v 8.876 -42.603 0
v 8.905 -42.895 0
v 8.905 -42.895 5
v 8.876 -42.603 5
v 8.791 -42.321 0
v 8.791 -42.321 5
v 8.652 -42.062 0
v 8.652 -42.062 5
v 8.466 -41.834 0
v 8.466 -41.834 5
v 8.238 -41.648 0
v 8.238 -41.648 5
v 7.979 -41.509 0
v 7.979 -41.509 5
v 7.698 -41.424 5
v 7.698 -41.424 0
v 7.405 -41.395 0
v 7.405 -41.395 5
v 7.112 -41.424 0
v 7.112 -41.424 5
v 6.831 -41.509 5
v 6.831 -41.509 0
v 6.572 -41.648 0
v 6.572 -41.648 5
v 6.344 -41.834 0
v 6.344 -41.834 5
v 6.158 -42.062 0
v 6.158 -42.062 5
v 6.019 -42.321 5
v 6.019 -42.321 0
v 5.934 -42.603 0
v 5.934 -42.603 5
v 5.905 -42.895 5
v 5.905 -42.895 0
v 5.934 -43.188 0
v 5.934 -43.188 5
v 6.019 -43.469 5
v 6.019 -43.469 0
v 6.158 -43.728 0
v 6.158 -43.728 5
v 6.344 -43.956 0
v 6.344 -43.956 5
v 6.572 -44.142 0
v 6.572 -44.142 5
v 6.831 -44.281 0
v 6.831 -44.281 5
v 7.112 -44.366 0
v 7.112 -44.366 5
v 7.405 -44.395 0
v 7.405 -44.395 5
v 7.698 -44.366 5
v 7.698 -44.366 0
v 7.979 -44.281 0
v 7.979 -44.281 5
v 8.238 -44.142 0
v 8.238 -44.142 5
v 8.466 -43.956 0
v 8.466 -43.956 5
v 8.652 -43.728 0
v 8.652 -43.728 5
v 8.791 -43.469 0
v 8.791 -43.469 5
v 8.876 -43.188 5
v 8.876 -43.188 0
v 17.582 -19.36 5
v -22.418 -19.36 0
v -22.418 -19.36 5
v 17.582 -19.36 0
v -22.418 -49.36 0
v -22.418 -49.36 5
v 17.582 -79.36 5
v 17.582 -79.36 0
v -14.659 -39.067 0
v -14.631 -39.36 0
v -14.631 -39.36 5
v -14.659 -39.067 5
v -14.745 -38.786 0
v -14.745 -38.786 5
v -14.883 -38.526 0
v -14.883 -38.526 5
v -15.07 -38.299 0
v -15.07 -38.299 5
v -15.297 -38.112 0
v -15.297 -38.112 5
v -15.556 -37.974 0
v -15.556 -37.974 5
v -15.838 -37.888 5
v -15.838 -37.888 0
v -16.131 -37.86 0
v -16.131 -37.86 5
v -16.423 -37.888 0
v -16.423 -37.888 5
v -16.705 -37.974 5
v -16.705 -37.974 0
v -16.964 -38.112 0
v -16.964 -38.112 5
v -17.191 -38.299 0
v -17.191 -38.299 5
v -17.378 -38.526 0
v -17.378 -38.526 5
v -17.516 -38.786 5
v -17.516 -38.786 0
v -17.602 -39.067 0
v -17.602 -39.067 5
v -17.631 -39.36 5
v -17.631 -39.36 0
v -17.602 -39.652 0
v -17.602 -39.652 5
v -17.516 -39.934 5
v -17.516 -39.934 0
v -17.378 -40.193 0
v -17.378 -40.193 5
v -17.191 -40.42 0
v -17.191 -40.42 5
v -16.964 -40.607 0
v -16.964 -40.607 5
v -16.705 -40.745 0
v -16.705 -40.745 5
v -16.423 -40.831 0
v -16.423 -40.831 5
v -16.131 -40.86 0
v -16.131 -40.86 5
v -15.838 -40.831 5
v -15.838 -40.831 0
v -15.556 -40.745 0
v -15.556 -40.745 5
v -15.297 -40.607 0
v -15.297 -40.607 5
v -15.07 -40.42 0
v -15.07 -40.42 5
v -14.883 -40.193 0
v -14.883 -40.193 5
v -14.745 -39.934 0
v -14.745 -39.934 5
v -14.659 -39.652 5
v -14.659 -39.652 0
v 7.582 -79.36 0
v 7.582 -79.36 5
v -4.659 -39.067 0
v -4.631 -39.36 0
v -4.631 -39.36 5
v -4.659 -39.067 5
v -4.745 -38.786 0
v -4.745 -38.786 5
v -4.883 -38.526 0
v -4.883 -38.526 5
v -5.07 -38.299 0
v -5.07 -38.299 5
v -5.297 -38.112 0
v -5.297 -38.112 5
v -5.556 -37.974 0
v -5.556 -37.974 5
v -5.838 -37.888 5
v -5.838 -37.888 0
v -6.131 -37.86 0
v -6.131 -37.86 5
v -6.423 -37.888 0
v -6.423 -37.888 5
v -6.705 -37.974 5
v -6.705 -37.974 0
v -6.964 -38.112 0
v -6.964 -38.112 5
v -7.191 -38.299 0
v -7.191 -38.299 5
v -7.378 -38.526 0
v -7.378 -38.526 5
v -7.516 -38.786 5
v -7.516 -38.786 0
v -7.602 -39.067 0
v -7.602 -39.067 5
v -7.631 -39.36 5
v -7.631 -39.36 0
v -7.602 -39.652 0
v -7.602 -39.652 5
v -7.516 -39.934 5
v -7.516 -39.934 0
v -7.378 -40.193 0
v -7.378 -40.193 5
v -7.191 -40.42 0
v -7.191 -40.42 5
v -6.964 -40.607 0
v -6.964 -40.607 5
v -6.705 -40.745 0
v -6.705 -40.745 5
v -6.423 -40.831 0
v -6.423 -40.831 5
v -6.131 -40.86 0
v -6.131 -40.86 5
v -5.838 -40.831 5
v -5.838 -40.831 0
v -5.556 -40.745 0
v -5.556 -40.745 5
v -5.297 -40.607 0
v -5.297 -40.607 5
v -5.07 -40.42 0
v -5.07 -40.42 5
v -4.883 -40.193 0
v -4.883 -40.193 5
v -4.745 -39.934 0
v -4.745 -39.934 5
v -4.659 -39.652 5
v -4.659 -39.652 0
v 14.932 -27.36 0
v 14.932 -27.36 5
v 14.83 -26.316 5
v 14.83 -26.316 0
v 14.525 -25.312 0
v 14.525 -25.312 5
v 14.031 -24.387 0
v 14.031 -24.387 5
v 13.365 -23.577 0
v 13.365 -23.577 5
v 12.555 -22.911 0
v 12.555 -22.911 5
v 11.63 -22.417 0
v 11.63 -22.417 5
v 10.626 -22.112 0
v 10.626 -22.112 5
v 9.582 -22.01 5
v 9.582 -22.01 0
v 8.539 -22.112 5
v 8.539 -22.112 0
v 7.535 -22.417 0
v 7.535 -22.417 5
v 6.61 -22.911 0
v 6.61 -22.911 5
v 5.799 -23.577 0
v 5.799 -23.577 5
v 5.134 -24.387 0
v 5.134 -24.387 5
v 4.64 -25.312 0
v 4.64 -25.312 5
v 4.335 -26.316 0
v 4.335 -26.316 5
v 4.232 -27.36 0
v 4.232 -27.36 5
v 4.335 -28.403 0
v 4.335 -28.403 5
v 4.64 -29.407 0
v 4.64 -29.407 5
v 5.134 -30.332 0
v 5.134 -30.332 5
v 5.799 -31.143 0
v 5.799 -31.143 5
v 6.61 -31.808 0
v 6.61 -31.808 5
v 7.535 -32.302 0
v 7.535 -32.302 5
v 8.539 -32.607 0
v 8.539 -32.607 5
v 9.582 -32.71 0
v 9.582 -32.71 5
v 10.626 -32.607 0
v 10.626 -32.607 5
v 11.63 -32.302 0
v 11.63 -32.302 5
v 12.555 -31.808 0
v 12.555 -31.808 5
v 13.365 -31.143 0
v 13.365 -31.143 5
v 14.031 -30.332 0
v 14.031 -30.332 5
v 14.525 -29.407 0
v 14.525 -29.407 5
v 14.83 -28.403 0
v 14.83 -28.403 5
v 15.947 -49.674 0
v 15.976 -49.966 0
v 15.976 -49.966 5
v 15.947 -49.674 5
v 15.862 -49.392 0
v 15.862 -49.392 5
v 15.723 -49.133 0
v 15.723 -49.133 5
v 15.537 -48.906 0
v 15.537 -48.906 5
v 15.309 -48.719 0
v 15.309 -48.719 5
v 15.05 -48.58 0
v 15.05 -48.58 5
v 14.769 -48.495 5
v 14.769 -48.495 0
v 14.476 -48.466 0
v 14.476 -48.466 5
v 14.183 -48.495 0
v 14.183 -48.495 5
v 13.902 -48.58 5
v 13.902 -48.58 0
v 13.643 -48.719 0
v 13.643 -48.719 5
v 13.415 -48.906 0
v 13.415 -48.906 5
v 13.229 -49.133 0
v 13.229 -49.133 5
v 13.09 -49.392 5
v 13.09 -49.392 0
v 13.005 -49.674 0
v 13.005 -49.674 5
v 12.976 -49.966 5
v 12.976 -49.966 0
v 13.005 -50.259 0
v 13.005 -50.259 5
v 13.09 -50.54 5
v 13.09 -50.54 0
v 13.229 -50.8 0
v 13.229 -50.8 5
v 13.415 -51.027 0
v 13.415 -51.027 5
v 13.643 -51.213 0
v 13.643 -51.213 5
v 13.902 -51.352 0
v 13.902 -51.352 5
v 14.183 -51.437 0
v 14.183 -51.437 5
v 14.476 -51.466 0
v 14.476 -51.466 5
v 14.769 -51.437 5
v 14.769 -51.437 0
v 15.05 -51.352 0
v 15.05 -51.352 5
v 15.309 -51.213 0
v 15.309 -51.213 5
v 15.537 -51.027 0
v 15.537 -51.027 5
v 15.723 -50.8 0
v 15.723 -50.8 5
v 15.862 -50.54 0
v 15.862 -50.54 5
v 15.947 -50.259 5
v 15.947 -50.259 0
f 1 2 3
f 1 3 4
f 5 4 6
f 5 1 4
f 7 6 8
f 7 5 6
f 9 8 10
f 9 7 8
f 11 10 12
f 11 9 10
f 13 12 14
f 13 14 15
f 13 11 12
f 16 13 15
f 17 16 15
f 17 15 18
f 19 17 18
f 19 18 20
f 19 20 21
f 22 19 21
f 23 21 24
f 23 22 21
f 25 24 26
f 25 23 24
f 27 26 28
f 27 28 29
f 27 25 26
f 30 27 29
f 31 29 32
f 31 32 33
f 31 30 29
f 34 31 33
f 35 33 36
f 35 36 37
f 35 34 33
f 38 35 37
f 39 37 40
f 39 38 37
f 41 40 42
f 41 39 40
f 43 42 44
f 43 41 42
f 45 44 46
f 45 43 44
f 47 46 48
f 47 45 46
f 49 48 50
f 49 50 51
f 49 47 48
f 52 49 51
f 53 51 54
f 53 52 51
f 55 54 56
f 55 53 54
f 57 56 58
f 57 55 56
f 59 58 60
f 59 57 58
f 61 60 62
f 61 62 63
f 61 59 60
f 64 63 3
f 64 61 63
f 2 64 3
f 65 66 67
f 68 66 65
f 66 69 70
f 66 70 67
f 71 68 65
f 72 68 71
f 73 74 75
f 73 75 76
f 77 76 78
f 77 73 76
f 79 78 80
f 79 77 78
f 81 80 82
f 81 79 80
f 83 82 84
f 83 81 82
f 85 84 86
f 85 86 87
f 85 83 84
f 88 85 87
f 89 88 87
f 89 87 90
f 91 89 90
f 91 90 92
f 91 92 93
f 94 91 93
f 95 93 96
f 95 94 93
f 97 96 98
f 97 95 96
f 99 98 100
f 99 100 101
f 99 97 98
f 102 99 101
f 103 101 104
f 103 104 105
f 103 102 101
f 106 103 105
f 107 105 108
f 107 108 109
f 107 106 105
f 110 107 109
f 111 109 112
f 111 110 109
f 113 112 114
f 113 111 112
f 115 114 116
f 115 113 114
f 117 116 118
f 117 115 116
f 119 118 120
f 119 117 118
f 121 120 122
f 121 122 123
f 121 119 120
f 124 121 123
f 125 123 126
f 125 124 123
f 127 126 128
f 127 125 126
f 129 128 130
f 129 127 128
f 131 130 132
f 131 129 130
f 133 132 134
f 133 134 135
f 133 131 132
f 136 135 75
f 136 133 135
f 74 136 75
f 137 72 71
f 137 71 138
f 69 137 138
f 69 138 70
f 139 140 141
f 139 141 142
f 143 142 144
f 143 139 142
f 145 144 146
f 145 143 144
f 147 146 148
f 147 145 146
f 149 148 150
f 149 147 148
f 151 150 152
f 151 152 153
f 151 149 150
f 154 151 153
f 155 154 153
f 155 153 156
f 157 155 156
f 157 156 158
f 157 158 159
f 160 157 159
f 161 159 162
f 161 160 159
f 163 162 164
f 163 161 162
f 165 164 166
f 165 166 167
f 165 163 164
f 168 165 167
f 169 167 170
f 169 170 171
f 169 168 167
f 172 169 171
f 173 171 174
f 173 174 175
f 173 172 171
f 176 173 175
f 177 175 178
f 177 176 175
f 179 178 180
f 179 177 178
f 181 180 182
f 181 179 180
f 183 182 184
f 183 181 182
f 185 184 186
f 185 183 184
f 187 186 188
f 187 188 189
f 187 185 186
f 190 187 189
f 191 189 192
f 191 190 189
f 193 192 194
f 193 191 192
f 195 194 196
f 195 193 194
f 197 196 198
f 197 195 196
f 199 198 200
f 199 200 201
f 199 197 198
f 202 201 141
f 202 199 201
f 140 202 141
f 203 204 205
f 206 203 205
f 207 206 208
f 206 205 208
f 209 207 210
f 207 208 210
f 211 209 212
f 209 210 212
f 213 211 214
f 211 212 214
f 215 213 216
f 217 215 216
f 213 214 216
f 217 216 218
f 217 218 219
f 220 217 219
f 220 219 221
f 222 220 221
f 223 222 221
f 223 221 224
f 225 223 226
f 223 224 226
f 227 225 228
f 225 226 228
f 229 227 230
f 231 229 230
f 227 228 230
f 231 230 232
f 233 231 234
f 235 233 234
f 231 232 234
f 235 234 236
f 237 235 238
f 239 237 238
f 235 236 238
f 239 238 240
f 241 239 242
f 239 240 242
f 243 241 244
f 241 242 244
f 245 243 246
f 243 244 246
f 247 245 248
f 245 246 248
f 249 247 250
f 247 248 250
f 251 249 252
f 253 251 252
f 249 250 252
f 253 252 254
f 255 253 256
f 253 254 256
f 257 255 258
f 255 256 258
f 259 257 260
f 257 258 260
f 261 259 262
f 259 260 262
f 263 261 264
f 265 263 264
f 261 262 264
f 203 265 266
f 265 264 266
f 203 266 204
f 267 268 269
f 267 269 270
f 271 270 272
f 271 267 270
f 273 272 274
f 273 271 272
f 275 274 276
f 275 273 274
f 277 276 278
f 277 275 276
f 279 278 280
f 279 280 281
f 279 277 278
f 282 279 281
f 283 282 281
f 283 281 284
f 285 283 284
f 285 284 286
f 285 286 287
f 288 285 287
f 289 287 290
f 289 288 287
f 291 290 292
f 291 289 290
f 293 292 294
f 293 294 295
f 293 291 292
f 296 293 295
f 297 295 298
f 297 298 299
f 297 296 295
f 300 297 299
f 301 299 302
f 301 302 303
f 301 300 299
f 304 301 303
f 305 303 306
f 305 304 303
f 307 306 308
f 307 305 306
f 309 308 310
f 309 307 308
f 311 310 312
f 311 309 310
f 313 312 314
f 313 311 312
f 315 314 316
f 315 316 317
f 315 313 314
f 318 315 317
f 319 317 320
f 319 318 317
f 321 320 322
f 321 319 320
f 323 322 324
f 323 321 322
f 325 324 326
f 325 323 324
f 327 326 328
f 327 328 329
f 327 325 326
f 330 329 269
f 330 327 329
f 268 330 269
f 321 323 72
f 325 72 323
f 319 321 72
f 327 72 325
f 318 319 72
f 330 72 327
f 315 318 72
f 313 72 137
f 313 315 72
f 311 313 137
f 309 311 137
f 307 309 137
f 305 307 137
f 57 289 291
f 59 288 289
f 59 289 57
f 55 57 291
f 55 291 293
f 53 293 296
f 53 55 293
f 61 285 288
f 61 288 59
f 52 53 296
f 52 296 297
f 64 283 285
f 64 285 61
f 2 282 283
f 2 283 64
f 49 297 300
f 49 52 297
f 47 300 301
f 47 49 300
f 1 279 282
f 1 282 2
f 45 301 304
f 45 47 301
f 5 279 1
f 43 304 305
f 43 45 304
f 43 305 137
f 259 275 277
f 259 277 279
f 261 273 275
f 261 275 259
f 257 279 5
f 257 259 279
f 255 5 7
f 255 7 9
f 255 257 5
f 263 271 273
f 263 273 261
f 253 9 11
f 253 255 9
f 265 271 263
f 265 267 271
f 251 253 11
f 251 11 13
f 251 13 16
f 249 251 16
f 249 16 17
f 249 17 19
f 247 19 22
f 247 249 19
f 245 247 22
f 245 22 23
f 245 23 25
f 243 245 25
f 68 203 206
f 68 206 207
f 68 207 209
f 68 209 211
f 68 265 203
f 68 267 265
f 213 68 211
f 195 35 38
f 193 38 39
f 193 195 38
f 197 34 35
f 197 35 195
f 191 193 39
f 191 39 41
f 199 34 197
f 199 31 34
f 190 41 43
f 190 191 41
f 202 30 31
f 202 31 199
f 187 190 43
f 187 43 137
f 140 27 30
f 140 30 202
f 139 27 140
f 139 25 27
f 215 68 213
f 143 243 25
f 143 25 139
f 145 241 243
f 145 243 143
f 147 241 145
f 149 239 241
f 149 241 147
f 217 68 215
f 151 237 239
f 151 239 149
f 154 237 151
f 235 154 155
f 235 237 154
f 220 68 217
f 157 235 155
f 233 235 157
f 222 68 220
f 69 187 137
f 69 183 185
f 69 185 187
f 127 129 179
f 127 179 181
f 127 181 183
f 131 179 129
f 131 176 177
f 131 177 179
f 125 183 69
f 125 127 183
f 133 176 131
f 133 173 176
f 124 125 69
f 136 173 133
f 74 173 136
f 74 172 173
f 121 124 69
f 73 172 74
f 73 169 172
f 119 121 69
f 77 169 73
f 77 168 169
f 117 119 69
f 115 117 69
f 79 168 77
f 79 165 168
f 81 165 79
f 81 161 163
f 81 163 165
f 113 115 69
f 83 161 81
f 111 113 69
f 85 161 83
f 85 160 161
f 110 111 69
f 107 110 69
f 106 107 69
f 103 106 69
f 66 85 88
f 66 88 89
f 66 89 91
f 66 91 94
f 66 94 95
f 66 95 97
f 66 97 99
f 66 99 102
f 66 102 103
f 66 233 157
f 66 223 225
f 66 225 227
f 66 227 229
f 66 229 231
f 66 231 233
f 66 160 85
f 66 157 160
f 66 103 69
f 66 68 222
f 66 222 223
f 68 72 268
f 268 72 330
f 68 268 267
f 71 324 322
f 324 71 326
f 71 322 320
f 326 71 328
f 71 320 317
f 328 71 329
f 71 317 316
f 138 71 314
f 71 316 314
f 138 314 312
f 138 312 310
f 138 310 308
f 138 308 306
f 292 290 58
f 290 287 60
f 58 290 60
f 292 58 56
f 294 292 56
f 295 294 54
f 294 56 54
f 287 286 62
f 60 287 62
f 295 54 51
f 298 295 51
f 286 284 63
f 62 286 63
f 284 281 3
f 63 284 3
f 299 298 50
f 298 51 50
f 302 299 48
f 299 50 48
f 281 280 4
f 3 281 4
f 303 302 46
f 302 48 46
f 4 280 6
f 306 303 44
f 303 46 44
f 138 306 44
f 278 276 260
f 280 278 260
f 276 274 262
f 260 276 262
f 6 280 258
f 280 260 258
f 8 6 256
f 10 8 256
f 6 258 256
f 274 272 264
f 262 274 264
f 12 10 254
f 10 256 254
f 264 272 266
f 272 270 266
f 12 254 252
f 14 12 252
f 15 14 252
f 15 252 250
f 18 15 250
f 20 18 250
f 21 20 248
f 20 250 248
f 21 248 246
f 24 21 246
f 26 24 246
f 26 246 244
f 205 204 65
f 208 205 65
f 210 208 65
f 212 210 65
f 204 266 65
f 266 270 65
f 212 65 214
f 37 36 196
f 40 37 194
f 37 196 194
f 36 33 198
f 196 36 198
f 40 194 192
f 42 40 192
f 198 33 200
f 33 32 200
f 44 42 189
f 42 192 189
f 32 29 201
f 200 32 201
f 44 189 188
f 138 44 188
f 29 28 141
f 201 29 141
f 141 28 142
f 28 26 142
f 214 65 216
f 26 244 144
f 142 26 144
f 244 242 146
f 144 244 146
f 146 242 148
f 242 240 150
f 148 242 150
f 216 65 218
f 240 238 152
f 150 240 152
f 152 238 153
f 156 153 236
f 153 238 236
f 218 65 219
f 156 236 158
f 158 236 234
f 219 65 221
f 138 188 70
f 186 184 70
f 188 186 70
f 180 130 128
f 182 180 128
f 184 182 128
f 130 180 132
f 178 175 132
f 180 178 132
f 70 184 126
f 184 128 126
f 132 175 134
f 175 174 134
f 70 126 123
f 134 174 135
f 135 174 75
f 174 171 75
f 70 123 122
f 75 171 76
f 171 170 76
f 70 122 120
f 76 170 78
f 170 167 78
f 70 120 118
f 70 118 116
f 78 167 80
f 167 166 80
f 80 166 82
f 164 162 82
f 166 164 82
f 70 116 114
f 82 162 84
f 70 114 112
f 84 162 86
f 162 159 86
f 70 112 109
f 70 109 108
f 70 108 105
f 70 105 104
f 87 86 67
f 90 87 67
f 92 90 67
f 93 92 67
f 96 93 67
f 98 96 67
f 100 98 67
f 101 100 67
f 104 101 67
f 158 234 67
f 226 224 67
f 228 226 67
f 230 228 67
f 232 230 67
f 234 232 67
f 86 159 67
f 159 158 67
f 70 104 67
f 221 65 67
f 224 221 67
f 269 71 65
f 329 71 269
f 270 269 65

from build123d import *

# Parameters (mm, degrees)
SKETCH1_R           = 1.5
SKETCH1_R_2         = 4
BOSS_EXTRUDE1_DEPTH = 5
SKETCH2_R           = 5.35
CUT_EXTRUDE1_DEPTH  = 5


with BuildPart() as part:
    # Sketch1 → Boss-Extrude1 (new body)
    with BuildSketch(Plane.XY):
        Polygon((-22.417673347, -49.359609207), (-22.417673347, -19.359609207), (17.582326653, -19.359609207), (17.582326653, -79.359609207), (7.582326653, -79.359609207), align=None)
        with Locations((-16.130508289, -39.359609207)):
            Circle(SKETCH1_R, mode=Mode.SUBTRACT)
        with Locations((-6.130508289, -39.359609207)):
            Circle(SKETCH1_R, mode=Mode.SUBTRACT)
        with Locations((7.405025617, -42.895143113)):
            Circle(SKETCH1_R, mode=Mode.SUBTRACT)
        with Locations((14.476093428, -49.966210925)):
            Circle(SKETCH1_R, mode=Mode.SUBTRACT)
        with Locations((9.582326653, -27.359609207)):
            Circle(SKETCH1_R_2, mode=Mode.SUBTRACT)
    extrude(amount=BOSS_EXTRUDE1_DEPTH)

    # Sketch2 → Cut-Extrude1 (cut)
    with BuildSketch(Plane.XY.offset(5)):
        with Locations((9.582326653, -27.359609207)):
            Circle(SKETCH2_R)
    extrude(amount=-CUT_EXTRUDE1_DEPTH, mode=Mode.SUBTRACT)


solid = part.part
